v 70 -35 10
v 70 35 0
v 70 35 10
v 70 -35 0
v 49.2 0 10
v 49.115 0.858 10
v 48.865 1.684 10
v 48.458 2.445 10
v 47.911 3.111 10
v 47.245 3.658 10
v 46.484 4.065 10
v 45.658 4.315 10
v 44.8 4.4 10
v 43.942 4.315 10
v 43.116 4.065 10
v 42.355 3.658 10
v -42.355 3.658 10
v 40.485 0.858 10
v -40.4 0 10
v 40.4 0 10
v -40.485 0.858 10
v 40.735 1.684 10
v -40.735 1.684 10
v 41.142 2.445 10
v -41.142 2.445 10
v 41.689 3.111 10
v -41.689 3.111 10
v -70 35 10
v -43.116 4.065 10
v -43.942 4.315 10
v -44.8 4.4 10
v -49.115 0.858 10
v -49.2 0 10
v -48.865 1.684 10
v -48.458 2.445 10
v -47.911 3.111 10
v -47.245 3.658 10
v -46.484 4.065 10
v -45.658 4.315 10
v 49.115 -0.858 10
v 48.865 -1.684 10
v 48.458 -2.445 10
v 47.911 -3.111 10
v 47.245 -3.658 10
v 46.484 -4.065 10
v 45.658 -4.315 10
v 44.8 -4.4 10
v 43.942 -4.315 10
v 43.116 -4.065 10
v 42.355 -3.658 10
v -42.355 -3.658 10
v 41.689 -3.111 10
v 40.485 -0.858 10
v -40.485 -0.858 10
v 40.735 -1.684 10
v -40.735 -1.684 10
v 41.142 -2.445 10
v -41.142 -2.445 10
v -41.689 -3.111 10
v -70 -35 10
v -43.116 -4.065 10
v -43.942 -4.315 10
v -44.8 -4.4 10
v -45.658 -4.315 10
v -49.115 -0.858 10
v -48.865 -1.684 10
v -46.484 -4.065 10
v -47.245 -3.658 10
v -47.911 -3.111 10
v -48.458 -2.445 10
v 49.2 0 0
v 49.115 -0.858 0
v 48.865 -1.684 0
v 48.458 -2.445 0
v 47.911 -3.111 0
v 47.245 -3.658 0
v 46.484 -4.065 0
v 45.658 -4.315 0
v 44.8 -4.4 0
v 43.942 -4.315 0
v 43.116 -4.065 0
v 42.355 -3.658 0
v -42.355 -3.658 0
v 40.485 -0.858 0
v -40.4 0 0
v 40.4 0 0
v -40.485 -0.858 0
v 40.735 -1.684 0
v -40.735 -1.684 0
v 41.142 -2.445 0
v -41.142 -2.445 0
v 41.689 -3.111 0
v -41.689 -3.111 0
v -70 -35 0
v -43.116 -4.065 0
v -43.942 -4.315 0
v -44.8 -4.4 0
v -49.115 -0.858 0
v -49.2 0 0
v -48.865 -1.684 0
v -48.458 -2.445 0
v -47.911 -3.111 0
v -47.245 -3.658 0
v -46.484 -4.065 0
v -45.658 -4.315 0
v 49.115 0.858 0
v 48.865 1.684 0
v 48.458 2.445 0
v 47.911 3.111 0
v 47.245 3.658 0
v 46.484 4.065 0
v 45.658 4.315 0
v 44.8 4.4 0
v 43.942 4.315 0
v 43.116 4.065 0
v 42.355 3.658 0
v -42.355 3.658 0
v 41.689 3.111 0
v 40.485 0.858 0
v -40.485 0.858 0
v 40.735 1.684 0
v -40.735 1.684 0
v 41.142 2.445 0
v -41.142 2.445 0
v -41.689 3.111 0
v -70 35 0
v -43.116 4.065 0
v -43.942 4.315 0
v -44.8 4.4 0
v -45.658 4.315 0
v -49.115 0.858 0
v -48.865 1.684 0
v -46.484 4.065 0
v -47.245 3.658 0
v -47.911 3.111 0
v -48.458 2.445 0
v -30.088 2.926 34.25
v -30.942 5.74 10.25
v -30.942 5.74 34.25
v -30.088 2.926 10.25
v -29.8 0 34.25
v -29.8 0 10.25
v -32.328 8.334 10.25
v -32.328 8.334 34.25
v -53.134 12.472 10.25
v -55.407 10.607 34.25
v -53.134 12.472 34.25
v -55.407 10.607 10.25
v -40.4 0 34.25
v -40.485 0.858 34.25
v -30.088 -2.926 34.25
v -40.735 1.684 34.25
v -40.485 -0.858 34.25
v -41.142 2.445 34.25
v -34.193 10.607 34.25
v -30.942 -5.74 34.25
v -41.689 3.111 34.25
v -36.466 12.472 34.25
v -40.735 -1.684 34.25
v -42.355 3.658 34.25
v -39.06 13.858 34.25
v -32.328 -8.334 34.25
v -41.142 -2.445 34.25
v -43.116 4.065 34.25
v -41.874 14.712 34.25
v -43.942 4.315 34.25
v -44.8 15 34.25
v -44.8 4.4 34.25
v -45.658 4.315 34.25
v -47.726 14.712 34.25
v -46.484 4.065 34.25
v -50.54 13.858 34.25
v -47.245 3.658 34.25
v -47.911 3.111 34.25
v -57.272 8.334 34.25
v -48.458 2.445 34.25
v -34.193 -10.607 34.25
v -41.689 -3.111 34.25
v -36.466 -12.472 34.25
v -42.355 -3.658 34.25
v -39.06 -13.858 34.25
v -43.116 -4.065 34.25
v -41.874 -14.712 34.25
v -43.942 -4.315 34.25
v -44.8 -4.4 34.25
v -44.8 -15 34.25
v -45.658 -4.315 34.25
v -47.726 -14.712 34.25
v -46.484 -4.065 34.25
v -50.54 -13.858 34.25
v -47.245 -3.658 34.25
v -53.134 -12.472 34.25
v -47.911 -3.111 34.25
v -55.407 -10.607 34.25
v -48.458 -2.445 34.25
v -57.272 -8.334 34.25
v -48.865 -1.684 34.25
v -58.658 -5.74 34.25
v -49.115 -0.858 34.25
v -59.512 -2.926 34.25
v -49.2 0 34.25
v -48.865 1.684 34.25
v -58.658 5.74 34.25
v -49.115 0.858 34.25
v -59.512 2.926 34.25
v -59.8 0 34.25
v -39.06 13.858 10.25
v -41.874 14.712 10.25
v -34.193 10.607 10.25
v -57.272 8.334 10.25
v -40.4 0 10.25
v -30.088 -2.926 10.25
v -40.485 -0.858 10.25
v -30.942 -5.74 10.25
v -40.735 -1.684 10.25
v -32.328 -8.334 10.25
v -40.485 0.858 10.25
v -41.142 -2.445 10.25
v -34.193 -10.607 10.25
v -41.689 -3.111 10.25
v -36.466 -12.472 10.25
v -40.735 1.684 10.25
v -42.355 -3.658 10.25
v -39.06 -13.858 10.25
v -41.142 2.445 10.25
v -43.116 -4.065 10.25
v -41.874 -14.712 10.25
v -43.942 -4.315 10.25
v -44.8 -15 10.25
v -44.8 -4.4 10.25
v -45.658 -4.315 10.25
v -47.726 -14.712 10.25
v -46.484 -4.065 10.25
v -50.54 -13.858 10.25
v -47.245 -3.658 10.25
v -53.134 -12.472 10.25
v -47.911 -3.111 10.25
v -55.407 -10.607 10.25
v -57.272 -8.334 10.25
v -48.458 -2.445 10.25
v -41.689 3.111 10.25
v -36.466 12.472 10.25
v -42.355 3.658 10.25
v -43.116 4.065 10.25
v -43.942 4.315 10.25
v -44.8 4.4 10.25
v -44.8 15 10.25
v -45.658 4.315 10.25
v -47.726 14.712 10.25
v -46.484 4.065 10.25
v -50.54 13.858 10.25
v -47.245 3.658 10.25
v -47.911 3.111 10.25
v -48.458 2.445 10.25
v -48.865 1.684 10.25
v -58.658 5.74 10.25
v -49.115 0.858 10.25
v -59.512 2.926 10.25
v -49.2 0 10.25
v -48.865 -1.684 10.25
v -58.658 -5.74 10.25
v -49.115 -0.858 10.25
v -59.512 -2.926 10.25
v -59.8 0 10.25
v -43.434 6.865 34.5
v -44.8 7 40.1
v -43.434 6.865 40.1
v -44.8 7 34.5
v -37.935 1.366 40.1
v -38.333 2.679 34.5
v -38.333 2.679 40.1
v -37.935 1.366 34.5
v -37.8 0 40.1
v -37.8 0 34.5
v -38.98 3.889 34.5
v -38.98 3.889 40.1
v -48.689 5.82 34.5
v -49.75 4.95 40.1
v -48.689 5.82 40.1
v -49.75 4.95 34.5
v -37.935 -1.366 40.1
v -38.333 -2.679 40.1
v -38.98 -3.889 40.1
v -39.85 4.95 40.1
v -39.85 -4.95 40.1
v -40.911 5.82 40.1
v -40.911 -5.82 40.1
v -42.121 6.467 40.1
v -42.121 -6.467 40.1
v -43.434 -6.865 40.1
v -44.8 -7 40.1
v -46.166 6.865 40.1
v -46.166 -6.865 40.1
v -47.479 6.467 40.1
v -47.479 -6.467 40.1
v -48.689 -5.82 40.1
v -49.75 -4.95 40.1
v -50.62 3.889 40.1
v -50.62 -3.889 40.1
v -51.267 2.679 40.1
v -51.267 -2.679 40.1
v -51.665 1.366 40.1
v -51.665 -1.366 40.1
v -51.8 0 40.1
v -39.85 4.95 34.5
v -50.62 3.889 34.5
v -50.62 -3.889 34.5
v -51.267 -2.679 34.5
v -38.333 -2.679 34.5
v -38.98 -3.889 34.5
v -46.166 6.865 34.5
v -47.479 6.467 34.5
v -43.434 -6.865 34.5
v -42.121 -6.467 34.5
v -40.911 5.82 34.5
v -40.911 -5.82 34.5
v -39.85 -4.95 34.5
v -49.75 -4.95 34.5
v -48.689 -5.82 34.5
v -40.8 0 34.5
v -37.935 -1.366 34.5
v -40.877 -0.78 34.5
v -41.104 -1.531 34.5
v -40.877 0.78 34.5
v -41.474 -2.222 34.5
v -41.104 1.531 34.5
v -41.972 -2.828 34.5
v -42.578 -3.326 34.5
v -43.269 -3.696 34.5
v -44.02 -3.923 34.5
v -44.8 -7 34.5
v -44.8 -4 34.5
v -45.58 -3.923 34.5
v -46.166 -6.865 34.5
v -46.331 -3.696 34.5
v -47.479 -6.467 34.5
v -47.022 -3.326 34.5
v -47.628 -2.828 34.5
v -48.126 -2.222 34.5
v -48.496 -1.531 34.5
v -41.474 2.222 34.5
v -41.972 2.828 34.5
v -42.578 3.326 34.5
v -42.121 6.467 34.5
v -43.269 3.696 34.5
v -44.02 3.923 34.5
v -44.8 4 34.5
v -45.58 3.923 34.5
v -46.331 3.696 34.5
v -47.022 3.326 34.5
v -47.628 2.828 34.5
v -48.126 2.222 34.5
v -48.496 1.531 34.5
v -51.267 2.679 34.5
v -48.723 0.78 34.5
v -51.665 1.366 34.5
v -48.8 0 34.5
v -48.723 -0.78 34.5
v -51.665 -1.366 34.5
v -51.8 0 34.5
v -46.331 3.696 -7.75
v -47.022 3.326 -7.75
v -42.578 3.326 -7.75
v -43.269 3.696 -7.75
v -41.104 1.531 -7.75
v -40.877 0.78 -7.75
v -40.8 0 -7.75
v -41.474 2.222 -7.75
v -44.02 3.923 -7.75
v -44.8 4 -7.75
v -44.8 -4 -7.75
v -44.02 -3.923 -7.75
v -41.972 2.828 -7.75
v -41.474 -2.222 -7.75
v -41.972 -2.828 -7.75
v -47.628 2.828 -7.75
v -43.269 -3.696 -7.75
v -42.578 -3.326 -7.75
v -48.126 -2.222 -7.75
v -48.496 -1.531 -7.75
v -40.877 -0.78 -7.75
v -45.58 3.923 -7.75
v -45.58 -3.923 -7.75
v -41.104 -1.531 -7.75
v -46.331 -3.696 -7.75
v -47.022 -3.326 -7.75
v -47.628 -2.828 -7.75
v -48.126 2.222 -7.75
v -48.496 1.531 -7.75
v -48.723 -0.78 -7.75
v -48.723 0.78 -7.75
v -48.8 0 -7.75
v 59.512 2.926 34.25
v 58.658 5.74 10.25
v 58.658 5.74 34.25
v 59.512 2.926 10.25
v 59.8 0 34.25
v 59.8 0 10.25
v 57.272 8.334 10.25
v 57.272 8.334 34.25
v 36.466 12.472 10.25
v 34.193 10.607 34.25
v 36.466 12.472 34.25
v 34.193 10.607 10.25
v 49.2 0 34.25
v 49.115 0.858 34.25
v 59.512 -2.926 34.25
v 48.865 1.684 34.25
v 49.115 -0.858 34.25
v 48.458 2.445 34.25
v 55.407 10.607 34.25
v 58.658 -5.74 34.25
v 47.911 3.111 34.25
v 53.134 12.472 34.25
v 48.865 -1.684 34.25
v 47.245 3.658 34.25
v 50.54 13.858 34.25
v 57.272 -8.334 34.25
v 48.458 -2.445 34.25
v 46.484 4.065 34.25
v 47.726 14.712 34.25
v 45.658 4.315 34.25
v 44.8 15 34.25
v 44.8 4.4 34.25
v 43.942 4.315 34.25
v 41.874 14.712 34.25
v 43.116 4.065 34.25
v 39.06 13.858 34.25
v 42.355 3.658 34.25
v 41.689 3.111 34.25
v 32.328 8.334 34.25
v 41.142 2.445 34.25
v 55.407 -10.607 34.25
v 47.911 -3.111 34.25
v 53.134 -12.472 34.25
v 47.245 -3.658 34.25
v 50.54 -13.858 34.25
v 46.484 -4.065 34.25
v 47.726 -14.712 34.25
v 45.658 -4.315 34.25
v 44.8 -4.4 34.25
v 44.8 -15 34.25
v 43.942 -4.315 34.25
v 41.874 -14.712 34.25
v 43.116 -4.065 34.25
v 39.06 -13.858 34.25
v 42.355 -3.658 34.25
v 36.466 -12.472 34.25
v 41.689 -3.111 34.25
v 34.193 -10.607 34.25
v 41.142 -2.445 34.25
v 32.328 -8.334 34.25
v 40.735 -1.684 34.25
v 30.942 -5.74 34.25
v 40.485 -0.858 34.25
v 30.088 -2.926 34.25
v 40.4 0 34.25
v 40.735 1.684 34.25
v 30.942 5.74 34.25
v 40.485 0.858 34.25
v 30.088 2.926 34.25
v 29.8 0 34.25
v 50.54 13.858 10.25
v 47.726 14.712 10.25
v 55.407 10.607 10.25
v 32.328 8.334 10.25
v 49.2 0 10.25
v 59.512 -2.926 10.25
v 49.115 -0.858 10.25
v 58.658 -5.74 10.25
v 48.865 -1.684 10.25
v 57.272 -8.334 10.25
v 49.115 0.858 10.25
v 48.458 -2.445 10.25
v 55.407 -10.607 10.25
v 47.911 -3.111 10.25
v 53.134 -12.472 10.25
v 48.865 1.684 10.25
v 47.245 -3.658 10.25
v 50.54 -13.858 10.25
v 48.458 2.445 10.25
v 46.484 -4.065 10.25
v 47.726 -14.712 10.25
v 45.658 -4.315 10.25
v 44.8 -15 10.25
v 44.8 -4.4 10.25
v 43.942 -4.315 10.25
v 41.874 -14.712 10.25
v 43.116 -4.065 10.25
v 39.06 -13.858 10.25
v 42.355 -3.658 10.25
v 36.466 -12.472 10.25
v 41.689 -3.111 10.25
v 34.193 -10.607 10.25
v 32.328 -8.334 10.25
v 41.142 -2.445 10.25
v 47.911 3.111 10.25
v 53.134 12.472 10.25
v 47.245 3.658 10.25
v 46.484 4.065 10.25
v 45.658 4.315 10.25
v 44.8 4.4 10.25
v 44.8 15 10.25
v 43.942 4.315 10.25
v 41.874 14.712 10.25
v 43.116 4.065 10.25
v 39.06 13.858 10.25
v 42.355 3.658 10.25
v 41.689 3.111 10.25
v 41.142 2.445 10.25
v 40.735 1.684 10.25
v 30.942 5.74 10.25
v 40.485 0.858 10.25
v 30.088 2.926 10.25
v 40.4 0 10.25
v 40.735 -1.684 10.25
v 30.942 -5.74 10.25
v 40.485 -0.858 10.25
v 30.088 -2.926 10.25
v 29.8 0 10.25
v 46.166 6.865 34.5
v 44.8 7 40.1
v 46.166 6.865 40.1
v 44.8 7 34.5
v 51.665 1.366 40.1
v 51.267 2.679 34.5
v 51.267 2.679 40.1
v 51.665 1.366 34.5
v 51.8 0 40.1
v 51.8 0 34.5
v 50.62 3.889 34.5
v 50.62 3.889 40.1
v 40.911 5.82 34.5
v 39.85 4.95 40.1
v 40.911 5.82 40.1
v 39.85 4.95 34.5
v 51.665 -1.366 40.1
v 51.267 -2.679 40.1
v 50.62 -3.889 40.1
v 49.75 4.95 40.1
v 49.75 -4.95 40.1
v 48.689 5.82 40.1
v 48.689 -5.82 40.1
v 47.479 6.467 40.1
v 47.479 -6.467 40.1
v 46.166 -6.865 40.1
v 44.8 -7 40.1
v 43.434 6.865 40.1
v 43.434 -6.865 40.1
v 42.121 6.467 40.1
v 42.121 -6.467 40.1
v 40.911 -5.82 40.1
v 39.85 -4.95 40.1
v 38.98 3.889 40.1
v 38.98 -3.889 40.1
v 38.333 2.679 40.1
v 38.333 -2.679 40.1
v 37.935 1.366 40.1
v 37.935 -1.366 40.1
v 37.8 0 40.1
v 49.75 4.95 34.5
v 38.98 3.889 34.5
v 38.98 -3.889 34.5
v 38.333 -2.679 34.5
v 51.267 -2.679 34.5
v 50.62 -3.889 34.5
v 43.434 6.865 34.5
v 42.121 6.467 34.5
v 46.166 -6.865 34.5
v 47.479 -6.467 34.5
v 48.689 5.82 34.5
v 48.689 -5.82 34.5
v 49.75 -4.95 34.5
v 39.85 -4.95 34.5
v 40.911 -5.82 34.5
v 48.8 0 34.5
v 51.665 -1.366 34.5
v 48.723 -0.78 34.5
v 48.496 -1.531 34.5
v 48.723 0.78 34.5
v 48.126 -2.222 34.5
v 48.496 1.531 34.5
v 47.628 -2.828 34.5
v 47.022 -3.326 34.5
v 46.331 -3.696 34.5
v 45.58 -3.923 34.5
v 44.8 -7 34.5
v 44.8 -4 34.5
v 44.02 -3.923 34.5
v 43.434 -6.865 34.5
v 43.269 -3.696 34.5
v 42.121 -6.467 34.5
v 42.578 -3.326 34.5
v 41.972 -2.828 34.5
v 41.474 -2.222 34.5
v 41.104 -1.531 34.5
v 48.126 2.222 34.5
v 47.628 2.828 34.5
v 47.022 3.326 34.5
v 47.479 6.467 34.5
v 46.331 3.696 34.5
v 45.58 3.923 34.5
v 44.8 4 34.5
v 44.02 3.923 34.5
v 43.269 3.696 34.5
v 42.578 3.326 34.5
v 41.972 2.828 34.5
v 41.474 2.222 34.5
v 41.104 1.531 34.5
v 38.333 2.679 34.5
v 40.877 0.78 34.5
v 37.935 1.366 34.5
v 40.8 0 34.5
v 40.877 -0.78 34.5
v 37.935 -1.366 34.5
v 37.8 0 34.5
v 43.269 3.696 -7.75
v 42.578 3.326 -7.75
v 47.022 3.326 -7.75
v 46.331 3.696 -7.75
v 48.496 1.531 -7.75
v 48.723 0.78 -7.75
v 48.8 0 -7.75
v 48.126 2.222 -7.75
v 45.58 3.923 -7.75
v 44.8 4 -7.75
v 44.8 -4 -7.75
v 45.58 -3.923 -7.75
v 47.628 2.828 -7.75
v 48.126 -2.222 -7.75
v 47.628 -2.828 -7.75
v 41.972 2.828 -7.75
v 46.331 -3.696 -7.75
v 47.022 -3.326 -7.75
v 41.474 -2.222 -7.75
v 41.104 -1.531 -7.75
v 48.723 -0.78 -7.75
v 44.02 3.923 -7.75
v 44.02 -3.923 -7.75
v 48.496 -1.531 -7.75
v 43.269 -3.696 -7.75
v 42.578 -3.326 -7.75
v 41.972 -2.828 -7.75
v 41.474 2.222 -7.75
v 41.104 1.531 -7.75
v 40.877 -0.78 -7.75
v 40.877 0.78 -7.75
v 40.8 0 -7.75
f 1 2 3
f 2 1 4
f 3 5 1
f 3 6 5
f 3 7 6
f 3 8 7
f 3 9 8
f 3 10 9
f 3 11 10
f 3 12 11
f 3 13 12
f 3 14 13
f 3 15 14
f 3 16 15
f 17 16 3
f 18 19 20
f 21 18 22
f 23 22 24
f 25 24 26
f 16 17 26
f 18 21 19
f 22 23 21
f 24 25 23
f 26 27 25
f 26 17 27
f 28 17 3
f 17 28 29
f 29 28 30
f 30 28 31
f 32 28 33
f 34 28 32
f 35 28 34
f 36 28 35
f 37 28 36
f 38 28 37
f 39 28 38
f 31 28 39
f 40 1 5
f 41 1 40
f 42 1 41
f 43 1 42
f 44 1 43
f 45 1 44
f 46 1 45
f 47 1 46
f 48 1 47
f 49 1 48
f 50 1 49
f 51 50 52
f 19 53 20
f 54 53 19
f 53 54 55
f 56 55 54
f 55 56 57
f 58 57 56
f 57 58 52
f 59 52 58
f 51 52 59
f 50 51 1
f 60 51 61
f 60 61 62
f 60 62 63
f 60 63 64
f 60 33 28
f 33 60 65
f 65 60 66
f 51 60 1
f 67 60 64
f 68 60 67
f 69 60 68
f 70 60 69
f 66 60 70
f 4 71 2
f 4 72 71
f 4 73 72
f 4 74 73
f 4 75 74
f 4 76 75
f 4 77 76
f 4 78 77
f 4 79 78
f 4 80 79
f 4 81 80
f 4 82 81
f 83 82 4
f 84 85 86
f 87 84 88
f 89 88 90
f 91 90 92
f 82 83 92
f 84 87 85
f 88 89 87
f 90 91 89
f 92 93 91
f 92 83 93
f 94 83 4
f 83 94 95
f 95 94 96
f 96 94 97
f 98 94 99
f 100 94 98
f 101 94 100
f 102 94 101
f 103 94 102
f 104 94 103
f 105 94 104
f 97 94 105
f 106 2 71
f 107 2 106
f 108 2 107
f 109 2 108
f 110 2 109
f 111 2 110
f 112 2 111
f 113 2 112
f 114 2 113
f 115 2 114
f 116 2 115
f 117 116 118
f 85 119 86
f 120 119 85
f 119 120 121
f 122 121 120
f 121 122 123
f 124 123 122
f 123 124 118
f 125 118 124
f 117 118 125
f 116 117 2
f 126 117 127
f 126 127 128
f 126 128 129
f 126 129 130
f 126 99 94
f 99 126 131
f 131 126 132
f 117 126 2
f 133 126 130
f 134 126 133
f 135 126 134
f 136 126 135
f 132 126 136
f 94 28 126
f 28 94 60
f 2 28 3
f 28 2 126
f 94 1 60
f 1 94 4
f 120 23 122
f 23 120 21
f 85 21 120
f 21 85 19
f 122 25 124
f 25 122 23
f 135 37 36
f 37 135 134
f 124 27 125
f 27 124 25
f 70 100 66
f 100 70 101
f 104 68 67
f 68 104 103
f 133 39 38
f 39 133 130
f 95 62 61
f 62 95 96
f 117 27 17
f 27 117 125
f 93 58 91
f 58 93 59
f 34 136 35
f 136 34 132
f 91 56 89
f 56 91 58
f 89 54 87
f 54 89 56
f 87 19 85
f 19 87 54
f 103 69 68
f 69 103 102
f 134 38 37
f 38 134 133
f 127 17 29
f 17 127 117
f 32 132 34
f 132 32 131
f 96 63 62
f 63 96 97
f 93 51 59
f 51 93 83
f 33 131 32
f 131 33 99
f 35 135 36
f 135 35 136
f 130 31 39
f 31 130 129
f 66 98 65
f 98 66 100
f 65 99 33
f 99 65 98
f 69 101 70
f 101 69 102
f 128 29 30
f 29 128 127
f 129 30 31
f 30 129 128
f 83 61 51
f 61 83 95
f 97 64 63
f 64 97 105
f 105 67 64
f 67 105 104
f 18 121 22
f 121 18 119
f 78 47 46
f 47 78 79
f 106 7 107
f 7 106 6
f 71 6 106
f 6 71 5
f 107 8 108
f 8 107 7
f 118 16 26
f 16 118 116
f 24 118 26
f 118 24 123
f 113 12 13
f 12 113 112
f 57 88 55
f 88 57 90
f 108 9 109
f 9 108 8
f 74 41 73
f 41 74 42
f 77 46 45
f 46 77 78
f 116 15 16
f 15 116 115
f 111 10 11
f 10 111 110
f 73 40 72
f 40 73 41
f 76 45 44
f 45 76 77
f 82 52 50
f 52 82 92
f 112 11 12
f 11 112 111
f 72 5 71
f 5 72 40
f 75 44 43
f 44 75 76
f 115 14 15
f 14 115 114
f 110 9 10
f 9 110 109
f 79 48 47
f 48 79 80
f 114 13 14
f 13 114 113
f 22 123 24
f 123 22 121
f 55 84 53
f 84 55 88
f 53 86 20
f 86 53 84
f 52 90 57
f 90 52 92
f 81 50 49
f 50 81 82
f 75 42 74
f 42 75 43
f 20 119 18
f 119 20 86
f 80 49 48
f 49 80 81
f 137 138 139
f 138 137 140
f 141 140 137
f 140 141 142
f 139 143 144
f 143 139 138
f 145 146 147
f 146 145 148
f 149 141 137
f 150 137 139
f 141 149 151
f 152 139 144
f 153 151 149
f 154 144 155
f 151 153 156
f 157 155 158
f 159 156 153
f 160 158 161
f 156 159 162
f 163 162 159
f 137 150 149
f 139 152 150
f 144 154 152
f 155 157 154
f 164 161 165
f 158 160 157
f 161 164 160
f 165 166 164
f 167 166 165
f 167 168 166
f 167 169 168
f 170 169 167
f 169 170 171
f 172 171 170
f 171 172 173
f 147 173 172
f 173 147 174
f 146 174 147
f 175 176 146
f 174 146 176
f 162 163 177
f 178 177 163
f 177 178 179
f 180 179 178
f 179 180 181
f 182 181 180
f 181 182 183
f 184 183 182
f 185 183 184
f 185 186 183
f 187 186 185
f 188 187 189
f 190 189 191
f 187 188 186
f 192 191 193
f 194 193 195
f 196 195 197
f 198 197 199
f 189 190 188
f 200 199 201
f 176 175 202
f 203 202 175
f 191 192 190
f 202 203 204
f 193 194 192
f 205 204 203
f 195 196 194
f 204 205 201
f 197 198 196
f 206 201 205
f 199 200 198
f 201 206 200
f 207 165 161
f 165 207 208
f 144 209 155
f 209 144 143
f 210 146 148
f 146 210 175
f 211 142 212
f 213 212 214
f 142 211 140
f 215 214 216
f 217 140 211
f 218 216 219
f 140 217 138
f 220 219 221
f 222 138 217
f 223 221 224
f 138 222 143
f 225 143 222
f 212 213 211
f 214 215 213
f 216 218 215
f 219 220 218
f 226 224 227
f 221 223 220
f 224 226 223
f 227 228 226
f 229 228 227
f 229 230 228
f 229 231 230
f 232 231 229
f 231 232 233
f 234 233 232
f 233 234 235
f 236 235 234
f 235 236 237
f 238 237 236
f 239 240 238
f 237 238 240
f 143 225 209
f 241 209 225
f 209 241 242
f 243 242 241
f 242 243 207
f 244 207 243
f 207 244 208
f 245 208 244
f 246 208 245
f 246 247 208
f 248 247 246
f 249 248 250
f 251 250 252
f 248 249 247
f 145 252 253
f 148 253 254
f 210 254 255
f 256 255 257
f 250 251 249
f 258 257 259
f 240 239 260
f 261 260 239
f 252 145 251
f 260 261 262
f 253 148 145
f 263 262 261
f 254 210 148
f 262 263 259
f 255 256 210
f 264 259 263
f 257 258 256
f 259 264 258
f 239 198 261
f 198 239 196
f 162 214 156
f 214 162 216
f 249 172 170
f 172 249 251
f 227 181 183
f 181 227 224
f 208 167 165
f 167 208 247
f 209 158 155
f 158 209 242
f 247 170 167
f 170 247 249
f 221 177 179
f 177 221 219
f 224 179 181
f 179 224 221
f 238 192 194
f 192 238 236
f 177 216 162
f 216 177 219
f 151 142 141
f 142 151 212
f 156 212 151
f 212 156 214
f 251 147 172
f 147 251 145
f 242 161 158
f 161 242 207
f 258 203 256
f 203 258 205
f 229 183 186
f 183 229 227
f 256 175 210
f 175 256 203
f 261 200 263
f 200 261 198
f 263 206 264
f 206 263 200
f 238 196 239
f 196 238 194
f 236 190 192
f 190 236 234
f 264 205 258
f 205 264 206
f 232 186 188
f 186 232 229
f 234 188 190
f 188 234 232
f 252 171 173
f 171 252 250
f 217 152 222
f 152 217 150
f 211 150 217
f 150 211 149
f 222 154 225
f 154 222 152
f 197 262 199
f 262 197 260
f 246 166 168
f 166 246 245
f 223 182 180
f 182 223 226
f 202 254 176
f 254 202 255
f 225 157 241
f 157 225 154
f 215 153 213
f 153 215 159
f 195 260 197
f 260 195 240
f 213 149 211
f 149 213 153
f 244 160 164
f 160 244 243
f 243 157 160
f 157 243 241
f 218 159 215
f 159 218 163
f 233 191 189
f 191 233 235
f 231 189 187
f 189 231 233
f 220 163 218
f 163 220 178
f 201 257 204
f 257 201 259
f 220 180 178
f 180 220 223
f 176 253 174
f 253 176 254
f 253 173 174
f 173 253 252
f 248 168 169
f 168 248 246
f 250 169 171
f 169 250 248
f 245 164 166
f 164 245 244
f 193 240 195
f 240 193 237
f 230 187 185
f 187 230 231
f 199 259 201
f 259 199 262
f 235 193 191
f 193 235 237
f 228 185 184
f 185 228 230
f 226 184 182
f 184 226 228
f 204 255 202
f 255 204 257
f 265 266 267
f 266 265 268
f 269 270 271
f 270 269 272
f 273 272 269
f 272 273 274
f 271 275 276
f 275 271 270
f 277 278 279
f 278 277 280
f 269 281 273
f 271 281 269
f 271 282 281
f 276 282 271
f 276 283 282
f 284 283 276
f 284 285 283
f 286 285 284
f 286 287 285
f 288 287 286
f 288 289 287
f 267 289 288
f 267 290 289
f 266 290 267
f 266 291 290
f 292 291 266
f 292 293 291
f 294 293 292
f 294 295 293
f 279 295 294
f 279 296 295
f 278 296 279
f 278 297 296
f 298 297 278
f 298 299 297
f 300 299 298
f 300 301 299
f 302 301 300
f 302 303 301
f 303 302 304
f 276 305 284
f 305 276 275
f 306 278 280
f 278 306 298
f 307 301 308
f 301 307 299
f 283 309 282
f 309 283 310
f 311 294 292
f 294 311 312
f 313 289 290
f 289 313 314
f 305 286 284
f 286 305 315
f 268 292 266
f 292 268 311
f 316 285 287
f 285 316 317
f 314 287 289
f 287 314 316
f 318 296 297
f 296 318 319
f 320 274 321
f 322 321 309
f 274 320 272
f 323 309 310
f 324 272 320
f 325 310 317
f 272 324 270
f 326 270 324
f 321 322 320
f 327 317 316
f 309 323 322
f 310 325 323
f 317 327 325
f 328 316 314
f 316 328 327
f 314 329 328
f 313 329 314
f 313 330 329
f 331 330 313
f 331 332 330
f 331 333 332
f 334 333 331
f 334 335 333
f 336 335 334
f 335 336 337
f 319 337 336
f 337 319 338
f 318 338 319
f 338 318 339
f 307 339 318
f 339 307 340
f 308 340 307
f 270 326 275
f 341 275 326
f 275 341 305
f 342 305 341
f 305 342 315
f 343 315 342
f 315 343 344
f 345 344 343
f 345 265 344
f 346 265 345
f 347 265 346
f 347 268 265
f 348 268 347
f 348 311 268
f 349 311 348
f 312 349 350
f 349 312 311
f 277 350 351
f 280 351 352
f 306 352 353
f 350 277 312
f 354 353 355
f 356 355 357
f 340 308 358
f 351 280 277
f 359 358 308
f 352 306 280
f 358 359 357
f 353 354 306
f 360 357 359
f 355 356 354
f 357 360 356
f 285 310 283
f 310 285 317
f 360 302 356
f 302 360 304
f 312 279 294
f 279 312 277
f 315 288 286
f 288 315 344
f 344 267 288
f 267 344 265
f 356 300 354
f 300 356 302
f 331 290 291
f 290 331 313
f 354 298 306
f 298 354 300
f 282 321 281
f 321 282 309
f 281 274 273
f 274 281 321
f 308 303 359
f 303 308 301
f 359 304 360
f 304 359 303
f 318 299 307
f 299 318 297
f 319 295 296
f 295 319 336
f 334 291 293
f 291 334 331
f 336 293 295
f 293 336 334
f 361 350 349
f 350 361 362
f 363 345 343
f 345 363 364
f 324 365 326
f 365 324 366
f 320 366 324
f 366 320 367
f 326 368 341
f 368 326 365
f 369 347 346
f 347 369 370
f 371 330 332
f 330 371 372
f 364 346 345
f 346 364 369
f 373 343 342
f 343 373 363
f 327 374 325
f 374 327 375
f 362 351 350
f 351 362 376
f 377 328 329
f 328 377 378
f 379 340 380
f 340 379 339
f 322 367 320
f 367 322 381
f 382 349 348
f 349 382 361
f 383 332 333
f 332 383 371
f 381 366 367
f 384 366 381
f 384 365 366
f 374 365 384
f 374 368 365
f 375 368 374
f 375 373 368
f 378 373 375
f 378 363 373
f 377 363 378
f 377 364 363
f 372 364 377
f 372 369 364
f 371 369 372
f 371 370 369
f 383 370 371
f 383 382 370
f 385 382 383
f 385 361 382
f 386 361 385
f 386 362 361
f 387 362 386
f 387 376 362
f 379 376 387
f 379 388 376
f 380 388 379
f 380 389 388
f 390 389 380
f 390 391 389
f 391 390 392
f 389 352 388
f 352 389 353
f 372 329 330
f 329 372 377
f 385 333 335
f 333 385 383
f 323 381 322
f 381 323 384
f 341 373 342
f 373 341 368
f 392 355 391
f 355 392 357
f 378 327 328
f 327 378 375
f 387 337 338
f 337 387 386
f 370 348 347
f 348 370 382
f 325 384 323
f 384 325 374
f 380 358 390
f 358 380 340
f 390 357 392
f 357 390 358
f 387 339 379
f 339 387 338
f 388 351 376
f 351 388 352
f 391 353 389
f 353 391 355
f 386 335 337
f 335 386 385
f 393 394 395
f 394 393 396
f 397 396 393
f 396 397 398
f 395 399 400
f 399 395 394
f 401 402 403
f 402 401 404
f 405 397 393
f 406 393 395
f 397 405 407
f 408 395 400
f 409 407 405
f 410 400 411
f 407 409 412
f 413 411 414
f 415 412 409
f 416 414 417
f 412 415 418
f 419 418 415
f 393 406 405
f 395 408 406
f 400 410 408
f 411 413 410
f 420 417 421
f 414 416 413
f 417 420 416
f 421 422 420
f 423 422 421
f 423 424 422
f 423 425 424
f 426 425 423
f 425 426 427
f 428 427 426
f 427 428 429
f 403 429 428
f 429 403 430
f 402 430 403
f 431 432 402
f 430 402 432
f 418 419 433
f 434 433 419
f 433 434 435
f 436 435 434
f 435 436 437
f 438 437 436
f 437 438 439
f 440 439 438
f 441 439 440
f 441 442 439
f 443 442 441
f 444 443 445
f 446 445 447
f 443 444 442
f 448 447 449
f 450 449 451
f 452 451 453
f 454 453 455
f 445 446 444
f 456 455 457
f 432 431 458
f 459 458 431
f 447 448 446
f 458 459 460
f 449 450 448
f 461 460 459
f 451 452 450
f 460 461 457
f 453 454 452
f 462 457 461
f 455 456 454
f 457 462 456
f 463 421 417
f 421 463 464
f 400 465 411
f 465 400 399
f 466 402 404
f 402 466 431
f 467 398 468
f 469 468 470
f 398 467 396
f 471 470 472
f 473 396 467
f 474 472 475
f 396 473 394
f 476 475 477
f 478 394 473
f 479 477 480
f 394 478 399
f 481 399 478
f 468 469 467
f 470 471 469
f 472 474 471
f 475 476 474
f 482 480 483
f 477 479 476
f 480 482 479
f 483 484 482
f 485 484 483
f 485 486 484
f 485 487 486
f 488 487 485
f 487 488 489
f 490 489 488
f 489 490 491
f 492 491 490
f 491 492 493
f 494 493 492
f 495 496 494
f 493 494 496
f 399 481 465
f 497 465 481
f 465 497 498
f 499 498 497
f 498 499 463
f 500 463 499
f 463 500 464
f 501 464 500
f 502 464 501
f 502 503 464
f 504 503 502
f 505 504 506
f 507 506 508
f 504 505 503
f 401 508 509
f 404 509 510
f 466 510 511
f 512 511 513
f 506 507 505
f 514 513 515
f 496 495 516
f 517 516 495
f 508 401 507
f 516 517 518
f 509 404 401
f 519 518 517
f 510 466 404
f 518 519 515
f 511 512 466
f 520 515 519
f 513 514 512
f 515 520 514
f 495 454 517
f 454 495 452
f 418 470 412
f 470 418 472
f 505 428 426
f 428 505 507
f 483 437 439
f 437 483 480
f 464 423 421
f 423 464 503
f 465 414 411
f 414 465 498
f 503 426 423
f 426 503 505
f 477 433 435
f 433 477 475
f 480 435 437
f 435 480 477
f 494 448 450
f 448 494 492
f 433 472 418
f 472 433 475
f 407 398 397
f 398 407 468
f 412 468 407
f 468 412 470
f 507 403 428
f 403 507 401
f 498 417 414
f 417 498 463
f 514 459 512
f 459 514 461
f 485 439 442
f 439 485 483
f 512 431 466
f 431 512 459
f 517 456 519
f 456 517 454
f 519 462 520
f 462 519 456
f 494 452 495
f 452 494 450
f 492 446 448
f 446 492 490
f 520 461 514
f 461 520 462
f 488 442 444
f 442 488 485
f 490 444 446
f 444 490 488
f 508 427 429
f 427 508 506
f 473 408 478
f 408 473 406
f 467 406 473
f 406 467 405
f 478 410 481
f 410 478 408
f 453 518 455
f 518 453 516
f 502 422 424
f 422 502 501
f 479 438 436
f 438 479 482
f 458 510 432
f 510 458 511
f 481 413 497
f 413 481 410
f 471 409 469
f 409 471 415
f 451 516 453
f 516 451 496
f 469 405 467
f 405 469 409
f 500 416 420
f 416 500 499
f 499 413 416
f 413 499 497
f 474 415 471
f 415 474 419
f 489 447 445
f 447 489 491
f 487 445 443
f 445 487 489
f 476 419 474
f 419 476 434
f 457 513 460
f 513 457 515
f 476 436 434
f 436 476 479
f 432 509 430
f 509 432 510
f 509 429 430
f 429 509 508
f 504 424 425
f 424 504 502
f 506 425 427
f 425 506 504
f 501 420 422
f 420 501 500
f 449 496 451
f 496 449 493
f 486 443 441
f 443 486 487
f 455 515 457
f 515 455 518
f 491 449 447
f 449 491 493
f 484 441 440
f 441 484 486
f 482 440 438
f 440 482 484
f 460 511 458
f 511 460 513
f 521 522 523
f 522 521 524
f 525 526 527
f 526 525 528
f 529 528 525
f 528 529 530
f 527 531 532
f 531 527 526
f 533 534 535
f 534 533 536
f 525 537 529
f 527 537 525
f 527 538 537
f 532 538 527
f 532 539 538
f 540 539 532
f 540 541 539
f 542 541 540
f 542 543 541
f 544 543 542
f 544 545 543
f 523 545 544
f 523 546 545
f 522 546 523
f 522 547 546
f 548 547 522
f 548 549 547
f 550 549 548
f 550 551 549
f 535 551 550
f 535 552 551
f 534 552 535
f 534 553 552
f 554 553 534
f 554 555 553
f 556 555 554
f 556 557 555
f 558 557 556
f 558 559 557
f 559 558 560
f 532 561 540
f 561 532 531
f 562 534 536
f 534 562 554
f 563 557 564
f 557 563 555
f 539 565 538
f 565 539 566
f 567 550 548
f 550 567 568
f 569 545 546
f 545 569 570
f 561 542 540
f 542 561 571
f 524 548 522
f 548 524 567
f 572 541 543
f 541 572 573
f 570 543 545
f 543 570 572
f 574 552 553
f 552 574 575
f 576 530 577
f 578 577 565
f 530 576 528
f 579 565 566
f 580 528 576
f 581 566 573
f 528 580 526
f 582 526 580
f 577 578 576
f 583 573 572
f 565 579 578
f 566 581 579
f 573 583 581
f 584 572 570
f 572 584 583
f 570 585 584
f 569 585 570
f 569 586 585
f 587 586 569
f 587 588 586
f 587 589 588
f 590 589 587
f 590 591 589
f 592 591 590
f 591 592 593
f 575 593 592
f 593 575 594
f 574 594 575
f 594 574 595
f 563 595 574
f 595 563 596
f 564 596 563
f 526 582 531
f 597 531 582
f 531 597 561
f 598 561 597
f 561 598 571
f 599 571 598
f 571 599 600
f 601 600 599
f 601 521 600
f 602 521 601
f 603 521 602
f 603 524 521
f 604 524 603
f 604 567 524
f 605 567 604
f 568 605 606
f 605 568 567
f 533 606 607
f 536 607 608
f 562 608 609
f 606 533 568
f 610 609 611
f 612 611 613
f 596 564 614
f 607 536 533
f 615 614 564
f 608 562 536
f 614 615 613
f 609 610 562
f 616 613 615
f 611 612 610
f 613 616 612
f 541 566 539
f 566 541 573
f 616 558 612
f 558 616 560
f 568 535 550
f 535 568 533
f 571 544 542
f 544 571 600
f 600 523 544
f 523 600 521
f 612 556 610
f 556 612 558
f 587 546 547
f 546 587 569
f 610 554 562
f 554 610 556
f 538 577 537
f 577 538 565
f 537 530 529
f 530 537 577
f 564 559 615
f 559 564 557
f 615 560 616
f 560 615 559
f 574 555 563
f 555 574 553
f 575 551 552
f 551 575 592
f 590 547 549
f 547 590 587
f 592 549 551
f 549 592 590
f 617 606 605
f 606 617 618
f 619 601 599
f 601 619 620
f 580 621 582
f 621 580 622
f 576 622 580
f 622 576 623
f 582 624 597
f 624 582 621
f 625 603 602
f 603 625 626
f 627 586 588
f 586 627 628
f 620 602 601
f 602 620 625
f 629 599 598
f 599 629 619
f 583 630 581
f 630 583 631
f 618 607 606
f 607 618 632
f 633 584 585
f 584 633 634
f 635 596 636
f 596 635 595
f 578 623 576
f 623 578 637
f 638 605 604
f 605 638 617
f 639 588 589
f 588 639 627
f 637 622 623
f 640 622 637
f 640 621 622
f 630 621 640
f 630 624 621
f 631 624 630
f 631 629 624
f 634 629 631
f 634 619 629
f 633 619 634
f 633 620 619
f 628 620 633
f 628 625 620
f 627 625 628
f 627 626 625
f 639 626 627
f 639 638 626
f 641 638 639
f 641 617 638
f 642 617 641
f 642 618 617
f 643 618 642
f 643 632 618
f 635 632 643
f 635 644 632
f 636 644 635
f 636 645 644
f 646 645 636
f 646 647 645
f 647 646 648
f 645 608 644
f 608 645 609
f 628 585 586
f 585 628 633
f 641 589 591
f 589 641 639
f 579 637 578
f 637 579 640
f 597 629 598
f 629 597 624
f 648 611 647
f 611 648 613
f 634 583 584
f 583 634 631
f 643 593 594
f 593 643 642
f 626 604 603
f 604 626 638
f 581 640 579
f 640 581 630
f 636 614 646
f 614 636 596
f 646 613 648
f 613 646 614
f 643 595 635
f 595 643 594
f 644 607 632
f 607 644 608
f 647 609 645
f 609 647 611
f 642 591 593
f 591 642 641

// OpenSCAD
$fn = 32;

// ------------------------------------------------------------------------
// Standoff columns: 2 d30 standoffs, bolts d8
// Every part is its own module, assembly() places them once.
// ------------------------------------------------------------------------

// --- part 1 ---
module base_plate() {
  difference() {
    translate([-70, -35, 0]) cube([140, 70, 10]);
    translate([-44.8, 0, -1]) cylinder(h = 12, d = 8.8);
    translate([44.8, 0, -1]) cylinder(h = 12, d = 8.8);
  }
}

// --- part 2 ---
module spacer1() {
  difference() {
      translate([0, 0, 0]) cylinder(h = 24, d = 30);
      translate([0, 0, -1]) cylinder(h = 26, d = 8.8);
    }
}

// --- part 3 ---
module bolt1() {
  cylinder(h = 5.6, d = 14);
  translate([0, 0, -42.25]) cylinder(h = 42.25, d = 8);
}

// --- part 4 ---
module spacer2() {
  difference() {
      translate([0, 0, 0]) cylinder(h = 24, d = 30);
      translate([0, 0, -1]) cylinder(h = 26, d = 8.8);
    }
}

// --- part 5 ---
module bolt2() {
  cylinder(h = 5.6, d = 14);
  translate([0, 0, -42.25]) cylinder(h = 42.25, d = 8);
}

// --- assembly ---
module assembly() {
  translate([0, 0, 0]) rotate([0, 0, 0]) base_plate();
  translate([-44.8, 0, 10.25]) rotate([0, 0, 0]) spacer1();
  translate([-44.8, 0, 34.5]) rotate([0, 0, 0]) bolt1();
  translate([44.8, 0, 10.25]) rotate([0, 0, 0]) spacer2();
  translate([44.8, 0, 34.5]) rotate([0, 0, 0]) bolt2();
}

assembly();
